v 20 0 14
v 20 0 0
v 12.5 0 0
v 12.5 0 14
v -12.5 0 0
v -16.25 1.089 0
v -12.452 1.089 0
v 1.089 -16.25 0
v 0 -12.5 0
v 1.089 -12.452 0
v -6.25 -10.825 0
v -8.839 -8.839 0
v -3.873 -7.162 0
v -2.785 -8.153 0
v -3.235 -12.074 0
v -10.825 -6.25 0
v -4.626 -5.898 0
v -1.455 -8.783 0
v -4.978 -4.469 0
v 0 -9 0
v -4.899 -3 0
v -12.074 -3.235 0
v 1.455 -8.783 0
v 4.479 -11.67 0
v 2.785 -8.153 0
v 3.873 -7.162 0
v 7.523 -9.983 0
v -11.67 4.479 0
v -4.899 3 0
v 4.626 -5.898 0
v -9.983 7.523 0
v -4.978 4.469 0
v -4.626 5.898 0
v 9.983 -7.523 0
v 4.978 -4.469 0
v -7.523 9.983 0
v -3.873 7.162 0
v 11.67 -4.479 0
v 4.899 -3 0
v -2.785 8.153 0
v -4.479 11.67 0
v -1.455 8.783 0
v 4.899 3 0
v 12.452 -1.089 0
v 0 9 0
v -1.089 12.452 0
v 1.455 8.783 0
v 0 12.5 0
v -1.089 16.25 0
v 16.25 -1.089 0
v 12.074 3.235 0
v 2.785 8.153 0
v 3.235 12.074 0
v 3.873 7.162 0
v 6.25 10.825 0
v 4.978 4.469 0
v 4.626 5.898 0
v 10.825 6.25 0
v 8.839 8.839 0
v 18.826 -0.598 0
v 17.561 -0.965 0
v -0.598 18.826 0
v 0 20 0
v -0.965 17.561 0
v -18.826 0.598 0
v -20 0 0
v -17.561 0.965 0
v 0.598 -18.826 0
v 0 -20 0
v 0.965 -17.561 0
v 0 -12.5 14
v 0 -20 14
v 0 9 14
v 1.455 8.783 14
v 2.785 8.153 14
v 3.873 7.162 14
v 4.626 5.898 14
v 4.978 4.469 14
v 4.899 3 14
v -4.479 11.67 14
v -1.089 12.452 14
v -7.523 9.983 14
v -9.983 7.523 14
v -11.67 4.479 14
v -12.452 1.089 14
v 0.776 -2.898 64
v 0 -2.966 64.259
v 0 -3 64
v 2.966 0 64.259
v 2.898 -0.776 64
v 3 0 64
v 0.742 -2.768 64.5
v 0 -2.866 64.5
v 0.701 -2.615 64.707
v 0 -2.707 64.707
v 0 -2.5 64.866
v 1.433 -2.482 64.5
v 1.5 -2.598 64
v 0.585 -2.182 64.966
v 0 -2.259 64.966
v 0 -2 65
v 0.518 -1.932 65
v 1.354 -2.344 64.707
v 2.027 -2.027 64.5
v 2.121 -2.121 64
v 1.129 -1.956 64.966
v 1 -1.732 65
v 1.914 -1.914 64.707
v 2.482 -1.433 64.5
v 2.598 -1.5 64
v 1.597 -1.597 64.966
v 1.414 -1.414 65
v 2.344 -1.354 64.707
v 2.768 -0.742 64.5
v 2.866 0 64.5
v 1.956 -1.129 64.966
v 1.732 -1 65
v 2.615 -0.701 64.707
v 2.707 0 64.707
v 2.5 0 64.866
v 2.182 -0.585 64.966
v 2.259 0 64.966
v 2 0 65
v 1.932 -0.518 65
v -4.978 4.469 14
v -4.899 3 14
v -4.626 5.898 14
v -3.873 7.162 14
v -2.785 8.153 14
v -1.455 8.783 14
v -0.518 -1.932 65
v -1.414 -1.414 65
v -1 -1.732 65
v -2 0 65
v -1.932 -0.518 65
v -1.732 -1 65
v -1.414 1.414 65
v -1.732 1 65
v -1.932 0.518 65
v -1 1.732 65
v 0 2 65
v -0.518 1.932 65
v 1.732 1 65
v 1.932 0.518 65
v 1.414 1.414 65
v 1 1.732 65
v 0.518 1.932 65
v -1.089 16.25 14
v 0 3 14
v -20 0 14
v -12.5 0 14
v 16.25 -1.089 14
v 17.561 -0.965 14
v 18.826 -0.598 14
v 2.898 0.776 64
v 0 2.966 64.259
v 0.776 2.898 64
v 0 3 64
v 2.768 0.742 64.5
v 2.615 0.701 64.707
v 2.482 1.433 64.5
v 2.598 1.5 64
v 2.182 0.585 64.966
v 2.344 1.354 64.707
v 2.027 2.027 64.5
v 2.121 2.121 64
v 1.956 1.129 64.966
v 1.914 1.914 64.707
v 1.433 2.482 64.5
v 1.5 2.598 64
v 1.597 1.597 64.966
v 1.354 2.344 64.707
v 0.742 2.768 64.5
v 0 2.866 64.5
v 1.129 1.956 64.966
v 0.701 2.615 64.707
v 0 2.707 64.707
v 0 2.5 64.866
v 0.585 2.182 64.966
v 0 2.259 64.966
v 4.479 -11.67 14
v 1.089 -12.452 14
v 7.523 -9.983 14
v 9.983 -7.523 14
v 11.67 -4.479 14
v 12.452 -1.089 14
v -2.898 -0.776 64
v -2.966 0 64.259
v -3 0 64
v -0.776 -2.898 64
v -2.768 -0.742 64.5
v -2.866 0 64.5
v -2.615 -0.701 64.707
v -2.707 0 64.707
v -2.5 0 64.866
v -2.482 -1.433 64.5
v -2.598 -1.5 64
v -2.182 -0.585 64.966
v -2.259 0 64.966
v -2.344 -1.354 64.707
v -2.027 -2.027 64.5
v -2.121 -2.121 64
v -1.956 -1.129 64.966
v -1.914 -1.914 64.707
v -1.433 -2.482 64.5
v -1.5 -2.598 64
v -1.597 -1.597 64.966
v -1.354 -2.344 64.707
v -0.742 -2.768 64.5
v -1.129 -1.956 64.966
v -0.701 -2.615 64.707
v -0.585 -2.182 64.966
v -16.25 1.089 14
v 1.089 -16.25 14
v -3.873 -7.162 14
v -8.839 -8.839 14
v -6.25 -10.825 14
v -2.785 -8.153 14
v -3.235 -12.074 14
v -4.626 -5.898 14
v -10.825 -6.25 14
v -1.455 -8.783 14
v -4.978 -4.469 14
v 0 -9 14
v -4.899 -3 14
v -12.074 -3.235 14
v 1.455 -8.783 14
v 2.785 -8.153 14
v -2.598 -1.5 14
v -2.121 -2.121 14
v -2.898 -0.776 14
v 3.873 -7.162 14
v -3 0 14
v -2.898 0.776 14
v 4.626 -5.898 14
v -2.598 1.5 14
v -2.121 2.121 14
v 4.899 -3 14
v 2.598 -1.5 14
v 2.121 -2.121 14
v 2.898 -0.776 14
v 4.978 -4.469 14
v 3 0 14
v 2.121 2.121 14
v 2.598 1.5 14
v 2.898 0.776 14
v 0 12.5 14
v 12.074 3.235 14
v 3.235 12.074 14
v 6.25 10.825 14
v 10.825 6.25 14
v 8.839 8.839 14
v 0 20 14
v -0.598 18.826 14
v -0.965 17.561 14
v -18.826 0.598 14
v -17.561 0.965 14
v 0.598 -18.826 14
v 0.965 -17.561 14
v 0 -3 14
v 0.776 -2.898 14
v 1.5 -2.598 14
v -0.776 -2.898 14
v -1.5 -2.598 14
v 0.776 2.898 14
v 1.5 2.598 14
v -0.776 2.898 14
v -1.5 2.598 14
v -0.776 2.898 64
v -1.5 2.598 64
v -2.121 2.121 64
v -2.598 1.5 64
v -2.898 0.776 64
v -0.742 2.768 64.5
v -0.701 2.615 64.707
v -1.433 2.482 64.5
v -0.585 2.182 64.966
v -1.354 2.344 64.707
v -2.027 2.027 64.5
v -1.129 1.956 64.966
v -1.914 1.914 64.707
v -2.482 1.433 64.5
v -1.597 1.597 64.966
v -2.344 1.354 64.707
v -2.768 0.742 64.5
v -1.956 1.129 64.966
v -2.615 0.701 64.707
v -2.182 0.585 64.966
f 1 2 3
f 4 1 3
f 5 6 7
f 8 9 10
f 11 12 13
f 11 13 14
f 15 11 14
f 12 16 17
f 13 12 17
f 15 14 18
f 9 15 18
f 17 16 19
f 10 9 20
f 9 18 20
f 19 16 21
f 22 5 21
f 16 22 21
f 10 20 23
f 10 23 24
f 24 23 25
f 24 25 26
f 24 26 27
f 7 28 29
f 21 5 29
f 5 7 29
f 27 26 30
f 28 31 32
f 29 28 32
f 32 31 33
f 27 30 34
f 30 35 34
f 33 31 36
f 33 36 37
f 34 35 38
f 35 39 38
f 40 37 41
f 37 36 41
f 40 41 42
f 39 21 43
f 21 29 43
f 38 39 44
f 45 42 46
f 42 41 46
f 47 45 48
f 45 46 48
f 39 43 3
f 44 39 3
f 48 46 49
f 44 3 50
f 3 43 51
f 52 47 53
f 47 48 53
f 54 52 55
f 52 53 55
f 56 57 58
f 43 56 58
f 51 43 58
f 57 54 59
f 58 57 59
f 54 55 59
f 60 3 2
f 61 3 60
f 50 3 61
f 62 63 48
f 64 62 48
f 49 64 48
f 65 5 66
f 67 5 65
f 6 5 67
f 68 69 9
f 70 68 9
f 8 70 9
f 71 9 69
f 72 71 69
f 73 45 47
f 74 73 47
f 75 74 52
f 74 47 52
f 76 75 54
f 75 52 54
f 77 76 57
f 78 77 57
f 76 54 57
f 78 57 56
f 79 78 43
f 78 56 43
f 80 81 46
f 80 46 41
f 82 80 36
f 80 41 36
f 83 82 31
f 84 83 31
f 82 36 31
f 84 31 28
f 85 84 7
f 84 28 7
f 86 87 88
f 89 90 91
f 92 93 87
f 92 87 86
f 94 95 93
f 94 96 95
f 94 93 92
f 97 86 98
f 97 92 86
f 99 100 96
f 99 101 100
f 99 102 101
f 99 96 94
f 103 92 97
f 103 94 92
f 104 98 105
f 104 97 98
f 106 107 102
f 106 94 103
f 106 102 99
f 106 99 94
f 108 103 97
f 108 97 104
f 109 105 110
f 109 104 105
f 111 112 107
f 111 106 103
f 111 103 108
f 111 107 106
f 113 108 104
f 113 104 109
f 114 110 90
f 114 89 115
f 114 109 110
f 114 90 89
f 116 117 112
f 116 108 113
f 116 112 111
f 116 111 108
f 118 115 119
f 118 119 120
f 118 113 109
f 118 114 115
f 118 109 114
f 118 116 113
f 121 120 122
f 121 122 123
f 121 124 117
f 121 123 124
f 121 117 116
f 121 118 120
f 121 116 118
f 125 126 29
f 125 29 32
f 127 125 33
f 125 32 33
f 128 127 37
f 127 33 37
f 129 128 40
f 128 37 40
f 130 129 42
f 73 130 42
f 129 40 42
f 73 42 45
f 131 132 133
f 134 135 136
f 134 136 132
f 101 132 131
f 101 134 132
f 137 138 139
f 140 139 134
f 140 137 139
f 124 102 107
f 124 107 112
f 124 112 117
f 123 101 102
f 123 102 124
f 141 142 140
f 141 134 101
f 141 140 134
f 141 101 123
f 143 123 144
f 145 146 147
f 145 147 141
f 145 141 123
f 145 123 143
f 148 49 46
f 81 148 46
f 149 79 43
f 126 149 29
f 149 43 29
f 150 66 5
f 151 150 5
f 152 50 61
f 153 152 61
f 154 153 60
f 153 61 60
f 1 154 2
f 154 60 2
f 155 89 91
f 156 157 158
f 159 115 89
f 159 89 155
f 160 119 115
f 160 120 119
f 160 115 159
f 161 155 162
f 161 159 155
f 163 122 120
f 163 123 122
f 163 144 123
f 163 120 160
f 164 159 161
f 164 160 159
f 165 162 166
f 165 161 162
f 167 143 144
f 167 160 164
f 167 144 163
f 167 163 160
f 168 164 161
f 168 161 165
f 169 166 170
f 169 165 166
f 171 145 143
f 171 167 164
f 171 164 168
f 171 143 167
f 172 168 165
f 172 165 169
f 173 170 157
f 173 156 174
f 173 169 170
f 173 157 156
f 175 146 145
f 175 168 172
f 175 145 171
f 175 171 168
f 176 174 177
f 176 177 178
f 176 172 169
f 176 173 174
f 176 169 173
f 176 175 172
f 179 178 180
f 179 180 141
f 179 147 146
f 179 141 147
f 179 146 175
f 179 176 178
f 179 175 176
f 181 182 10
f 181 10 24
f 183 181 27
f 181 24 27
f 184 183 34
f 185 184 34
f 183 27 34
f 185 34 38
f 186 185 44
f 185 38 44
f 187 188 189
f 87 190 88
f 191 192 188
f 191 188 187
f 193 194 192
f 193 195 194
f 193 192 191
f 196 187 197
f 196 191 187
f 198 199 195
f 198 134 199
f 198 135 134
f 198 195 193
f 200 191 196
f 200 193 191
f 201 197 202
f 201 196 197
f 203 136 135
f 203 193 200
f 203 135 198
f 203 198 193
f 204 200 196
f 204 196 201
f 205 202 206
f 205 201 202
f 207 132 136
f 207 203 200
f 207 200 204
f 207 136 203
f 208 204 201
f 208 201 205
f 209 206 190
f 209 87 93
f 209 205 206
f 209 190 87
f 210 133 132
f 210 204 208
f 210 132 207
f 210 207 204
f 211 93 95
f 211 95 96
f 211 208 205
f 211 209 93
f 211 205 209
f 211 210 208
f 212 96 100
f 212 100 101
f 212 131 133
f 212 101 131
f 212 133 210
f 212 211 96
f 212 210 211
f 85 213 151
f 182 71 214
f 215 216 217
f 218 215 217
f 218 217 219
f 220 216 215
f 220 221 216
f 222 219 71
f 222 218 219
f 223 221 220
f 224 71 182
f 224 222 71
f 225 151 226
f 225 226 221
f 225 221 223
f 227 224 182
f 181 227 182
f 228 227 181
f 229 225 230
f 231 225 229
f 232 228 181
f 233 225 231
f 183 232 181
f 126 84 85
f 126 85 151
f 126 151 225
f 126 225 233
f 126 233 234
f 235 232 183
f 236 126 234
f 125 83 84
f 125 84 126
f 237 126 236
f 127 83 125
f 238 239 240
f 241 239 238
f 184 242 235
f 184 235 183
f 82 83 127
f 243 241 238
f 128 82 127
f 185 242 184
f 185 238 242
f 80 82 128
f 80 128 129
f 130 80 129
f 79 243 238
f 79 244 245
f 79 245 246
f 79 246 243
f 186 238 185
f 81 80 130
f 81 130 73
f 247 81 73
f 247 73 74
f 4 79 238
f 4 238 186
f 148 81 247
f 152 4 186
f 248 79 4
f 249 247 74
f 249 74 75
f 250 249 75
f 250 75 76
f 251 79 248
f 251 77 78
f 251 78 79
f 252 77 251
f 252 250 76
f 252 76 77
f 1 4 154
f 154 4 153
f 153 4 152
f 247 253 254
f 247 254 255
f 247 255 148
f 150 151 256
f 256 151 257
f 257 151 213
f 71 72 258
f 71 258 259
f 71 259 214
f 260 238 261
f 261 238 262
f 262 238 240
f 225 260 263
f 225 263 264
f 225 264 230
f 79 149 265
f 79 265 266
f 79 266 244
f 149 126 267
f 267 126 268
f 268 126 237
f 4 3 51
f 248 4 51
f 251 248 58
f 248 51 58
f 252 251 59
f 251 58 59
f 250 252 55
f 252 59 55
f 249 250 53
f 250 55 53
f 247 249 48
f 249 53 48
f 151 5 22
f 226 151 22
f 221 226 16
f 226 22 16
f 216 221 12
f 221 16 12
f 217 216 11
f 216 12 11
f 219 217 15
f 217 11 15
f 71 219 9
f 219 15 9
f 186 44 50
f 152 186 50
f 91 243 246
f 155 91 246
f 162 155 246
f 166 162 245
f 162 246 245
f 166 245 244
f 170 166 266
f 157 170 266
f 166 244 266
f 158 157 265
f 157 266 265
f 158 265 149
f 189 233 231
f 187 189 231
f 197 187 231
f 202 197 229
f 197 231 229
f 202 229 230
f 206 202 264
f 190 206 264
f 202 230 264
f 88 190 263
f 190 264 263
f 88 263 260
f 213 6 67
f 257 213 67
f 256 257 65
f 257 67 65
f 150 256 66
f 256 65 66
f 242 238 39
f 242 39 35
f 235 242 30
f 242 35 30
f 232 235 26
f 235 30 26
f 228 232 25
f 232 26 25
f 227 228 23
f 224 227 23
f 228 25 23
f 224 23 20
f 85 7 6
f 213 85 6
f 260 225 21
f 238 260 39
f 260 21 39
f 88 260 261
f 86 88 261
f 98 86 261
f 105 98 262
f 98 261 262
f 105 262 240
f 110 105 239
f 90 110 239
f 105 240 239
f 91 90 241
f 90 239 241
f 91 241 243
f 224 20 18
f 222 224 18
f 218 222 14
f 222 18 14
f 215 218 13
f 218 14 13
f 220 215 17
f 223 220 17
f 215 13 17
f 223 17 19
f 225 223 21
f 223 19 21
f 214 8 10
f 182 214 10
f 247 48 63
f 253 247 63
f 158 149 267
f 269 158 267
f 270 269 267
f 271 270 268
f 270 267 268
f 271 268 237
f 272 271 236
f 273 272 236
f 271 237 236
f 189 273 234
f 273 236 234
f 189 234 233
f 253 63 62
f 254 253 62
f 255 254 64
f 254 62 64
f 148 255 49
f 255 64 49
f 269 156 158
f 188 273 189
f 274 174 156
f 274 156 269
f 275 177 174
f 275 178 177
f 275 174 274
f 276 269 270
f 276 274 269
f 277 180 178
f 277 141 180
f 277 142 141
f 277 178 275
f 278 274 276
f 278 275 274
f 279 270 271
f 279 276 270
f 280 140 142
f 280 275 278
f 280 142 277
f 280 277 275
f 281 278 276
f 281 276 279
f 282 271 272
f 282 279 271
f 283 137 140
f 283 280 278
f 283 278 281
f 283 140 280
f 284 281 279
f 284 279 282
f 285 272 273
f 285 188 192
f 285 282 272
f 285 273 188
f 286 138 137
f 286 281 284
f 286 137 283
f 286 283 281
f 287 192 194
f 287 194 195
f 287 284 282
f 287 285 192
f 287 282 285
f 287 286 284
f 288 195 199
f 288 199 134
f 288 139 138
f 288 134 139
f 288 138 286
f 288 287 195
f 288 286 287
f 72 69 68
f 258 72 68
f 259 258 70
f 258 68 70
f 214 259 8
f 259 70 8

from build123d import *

# Parameters (mm, degrees)
F1_DEPTH = 65
F2_DEPTH = 14
F3_DEPTH = 14
F4_R     = 1
F5_DEPTH = 14


# Not quite as in the source:
# - a feature names something its author has since deleted; it is built from what else it names


with BuildPart() as f1:
    # F0 (on Top) → F1 (new body)
    with BuildSketch(Plane.XY):
        with BuildLine():
            ThreePointArc((0, -3), (2.1213203436, -2.1213203436), (3, 0))
            Line((3, 0), (0, 0))
            Line((0, 0), (0, -3))
        make_face()
        with BuildLine():
            Line((0, 0), (3, 0))
            ThreePointArc((3, 0), (2.1213203436, 2.1213203436), (0, 3))
            Line((0, 3), (0, 0))
        make_face()
        with BuildLine():
            Line((0, 0), (0, 3))
            ThreePointArc((0, 3), (-2.1213203436, 2.1213203436), (-3, 0))
            Line((-3, 0), (0, 0))
        make_face()
        with BuildLine():
            ThreePointArc((-3, 0), (-2.1213203436, -2.1213203436), (0, -3))
            Line((0, -3), (0, 0))
            Line((0, 0), (-3, 0))
        make_face()
    extrude(amount=F1_DEPTH)



with BuildPart() as f2:
    # F0 (on Top) → F2 (new body)
    with BuildSketch(Plane.XY):
        with BuildLine():
            ThreePointArc((-4.8989794856, 3), (-3.8729833462, 7.1622776602), (0, 9))
            Line((0, 9), (0, 12.5))
            ThreePointArc((0, 12.5), (-0.545120999, 12.4881080671), (-1.0892047912, 12.4524548954))
            ThreePointArc((-1.0892047912, 12.4524548954), (-8.8388347648, 8.8388347648), (-12.4524548954, 1.0892047912))
            ThreePointArc((-12.4524548954, 1.0892047912), (-12.4881080671, 0.545120999), (-12.5, 0))
            Line((-12.5, 0), (-4.8989794856, 0))
            Line((-4.8989794856, 0), (-4.8989794856, 3))
        make_face()
        with BuildLine():
            Line((0, -12.5), (0, -9))
            ThreePointArc((0, -9), (-3.8729833462, -7.1622776602), (-4.8989794856, -3))
            Line((-4.8989794856, -3), (-4.8989794856, 0))
            Line((-4.8989794856, 0), (-12.5, 0))
            ThreePointArc((-12.5, 0), (-8.8388347648, -8.8388347648), (0, -12.5))
        make_face()
        with BuildLine():
            Line((12.5, 0), (4.8989794856, 0))
            Line((4.8989794856, 0), (4.8989794856, -3))
            ThreePointArc((4.8989794856, -3), (3.8729833462, -7.1622776602), (0, -9))
            Line((0, -9), (0, -12.5))
            ThreePointArc((0, -12.5), (0.545120999, -12.4881080671), (1.0892047912, -12.4524548954))
            ThreePointArc((1.0892047912, -12.4524548954), (8.8388347648, -8.8388347648), (12.4524548954, -1.0892047912))
            ThreePointArc((12.4524548954, -1.0892047912), (12.4881080671, -0.545120999), (12.5, 0))
        make_face()
        with BuildLine():
            Line((4.8989794856, 3), (4.8989794856, 0))
            Line((4.8989794856, 0), (12.5, 0))
            ThreePointArc((12.5, 0), (8.8388347648, 8.8388347648), (0, 12.5))
            Line((0, 12.5), (0, 9))
            ThreePointArc((0, 9), (3.8729833462, 7.1622776602), (4.8989794856, 3))
        make_face()
    extrude(amount=F2_DEPTH)


with BuildPart() as f1_1:
    add(f1.part)

    add(f2.part)  # F2#2 merges F2
    # F0 (on Top) → F2, piece 2 (join)
    with BuildSketch(Plane.XY):
        with BuildLine():
            ThreePointArc((-3, 0), (-2.1213203436, 2.1213203436), (0, 3))
            Line((0, 3), (-4.8989794856, 3))
            ThreePointArc((-4.8989794856, 3), (-4.2247448714, 1.3257653858), (-3, 0))
        make_face()
        with BuildLine():
            ThreePointArc((0, 3), (2.1213203436, 2.1213203436), (3, 0))
            ThreePointArc((3, 0), (4.2247448714, 1.3257653858), (4.8989794856, 3))
            Line((4.8989794856, 3), (0, 3))
        make_face()
        with BuildLine():
            ThreePointArc((4.8989794856, -3), (4.2247448714, -1.3257653858), (3, 0))
            ThreePointArc((3, 0), (2.1213203436, -2.1213203436), (0, -3))
            Line((0, -3), (4.8989794856, -3))
        make_face()
        with BuildLine():
            Line((-4.8989794856, -3), (0, -3))
            ThreePointArc((0, -3), (-2.1213203436, -2.1213203436), (-3, 0))
            ThreePointArc((-3, 0), (-4.2247448714, -1.3257653858), (-4.8989794856, -3))
        make_face()
    extrude(amount=F2_DEPTH)

    # F0 (on Top) → F3 (join)
    with BuildSketch(Plane.XY):
        with BuildLine():
            Line((20, 0), (12.5, 0))
            ThreePointArc((12.5, 0), (14.2975101103, -0.811390688), (16.25, -1.0892047912))
            ThreePointArc((16.25, -1.0892047912), (18.2024898897, -0.811390688), (20, 0))
        make_face()
        with BuildLine():
            ThreePointArc((-1.0892047912, 16.25), (-0.811390688, 14.2975101103), (0, 12.5))
            Line((0, 12.5), (0, 20))
            ThreePointArc((0, 20), (-0.811390688, 18.2024898897), (-1.0892047912, 16.25))
        make_face()
        with BuildLine():
            Line((-20, 0), (-12.5, 0))
            ThreePointArc((-12.5, 0), (-14.2975101103, 0.811390688), (-16.25, 1.0892047912))
            ThreePointArc((-16.25, 1.0892047912), (-18.2024898897, 0.811390688), (-20, 0))
        make_face()
        with BuildLine():
            ThreePointArc((1.0892047912, -16.25), (0.811390688, -14.2975101103), (0, -12.5))
            Line((0, -12.5), (0, -20))
            ThreePointArc((0, -20), (0.811390688, -18.2024898897), (1.0892047912, -16.25))
        make_face()
        with BuildLine():
            ThreePointArc((16.25, -1.0892047912), (14.2975101103, -0.811390688), (12.5, 0))
            ThreePointArc((12.5, 0), (12.4881080671, -0.545120999), (12.4524548954, -1.0892047912))
            Line((12.4524548954, -1.0892047912), (16.25, -1.0892047912))
        make_face()
        with BuildLine():
            ThreePointArc((-1.0892047912, 12.4524548954), (-0.545120999, 12.4881080671), (0, 12.5))
            ThreePointArc((0, 12.5), (-0.811390688, 14.2975101103), (-1.0892047912, 16.25))
            Line((-1.0892047912, 16.25), (-1.0892047912, 12.4524548954))
        make_face()
        with BuildLine():
            ThreePointArc((-16.25, 1.0892047912), (-14.2975101103, 0.811390688), (-12.5, 0))
            ThreePointArc((-12.5, 0), (-12.4881080671, 0.545120999), (-12.4524548954, 1.0892047912))
            Line((-12.4524548954, 1.0892047912), (-16.25, 1.0892047912))
        make_face()
        with BuildLine():
            ThreePointArc((1.0892047912, -12.4524548954), (0.545120999, -12.4881080671), (0, -12.5))
            ThreePointArc((0, -12.5), (0.811390688, -14.2975101103), (1.0892047912, -16.25))
            Line((1.0892047912, -16.25), (1.0892047912, -12.4524548954))
        make_face()
    extrude(amount=F3_DEPTH)

    # F4
    f4_edges = [f1_1.edges().sort_by_distance(p)[0] for p in [
        (3, 0, 65),
    ]]
    fillet(f4_edges, radius=F4_R)

    # F0 (on Top) → F5 (join)
    with BuildSketch(Plane.XY):
        with BuildLine():
            ThreePointArc((-4.8989794856, -3), (-4.2247448714, -1.3257653858), (-3, 0))
            Line((-3, 0), (-4.8989794856, 0))
            Line((-4.8989794856, 0), (-4.8989794856, -3))
        make_face()
        with BuildLine():
            Line((-4.8989794856, 0), (-3, 0))
            ThreePointArc((-3, 0), (-4.2247448714, 1.3257653858), (-4.8989794856, 3))
            Line((-4.8989794856, 3), (-4.8989794856, 0))
        make_face()
        with BuildLine():
            ThreePointArc((4.8989794856, 3), (4.2247448714, 1.3257653858), (3, 0))
            Line((3, 0), (4.8989794856, 0))
            Line((4.8989794856, 0), (4.8989794856, 3))
        make_face()
        with BuildLine():
            Line((4.8989794856, 0), (3, 0))
            ThreePointArc((3, 0), (4.2247448714, -1.3257653858), (4.8989794856, -3))
            Line((4.8989794856, -3), (4.8989794856, 0))
        make_face()
    extrude(amount=F5_DEPTH)


solid = f1_1.part
